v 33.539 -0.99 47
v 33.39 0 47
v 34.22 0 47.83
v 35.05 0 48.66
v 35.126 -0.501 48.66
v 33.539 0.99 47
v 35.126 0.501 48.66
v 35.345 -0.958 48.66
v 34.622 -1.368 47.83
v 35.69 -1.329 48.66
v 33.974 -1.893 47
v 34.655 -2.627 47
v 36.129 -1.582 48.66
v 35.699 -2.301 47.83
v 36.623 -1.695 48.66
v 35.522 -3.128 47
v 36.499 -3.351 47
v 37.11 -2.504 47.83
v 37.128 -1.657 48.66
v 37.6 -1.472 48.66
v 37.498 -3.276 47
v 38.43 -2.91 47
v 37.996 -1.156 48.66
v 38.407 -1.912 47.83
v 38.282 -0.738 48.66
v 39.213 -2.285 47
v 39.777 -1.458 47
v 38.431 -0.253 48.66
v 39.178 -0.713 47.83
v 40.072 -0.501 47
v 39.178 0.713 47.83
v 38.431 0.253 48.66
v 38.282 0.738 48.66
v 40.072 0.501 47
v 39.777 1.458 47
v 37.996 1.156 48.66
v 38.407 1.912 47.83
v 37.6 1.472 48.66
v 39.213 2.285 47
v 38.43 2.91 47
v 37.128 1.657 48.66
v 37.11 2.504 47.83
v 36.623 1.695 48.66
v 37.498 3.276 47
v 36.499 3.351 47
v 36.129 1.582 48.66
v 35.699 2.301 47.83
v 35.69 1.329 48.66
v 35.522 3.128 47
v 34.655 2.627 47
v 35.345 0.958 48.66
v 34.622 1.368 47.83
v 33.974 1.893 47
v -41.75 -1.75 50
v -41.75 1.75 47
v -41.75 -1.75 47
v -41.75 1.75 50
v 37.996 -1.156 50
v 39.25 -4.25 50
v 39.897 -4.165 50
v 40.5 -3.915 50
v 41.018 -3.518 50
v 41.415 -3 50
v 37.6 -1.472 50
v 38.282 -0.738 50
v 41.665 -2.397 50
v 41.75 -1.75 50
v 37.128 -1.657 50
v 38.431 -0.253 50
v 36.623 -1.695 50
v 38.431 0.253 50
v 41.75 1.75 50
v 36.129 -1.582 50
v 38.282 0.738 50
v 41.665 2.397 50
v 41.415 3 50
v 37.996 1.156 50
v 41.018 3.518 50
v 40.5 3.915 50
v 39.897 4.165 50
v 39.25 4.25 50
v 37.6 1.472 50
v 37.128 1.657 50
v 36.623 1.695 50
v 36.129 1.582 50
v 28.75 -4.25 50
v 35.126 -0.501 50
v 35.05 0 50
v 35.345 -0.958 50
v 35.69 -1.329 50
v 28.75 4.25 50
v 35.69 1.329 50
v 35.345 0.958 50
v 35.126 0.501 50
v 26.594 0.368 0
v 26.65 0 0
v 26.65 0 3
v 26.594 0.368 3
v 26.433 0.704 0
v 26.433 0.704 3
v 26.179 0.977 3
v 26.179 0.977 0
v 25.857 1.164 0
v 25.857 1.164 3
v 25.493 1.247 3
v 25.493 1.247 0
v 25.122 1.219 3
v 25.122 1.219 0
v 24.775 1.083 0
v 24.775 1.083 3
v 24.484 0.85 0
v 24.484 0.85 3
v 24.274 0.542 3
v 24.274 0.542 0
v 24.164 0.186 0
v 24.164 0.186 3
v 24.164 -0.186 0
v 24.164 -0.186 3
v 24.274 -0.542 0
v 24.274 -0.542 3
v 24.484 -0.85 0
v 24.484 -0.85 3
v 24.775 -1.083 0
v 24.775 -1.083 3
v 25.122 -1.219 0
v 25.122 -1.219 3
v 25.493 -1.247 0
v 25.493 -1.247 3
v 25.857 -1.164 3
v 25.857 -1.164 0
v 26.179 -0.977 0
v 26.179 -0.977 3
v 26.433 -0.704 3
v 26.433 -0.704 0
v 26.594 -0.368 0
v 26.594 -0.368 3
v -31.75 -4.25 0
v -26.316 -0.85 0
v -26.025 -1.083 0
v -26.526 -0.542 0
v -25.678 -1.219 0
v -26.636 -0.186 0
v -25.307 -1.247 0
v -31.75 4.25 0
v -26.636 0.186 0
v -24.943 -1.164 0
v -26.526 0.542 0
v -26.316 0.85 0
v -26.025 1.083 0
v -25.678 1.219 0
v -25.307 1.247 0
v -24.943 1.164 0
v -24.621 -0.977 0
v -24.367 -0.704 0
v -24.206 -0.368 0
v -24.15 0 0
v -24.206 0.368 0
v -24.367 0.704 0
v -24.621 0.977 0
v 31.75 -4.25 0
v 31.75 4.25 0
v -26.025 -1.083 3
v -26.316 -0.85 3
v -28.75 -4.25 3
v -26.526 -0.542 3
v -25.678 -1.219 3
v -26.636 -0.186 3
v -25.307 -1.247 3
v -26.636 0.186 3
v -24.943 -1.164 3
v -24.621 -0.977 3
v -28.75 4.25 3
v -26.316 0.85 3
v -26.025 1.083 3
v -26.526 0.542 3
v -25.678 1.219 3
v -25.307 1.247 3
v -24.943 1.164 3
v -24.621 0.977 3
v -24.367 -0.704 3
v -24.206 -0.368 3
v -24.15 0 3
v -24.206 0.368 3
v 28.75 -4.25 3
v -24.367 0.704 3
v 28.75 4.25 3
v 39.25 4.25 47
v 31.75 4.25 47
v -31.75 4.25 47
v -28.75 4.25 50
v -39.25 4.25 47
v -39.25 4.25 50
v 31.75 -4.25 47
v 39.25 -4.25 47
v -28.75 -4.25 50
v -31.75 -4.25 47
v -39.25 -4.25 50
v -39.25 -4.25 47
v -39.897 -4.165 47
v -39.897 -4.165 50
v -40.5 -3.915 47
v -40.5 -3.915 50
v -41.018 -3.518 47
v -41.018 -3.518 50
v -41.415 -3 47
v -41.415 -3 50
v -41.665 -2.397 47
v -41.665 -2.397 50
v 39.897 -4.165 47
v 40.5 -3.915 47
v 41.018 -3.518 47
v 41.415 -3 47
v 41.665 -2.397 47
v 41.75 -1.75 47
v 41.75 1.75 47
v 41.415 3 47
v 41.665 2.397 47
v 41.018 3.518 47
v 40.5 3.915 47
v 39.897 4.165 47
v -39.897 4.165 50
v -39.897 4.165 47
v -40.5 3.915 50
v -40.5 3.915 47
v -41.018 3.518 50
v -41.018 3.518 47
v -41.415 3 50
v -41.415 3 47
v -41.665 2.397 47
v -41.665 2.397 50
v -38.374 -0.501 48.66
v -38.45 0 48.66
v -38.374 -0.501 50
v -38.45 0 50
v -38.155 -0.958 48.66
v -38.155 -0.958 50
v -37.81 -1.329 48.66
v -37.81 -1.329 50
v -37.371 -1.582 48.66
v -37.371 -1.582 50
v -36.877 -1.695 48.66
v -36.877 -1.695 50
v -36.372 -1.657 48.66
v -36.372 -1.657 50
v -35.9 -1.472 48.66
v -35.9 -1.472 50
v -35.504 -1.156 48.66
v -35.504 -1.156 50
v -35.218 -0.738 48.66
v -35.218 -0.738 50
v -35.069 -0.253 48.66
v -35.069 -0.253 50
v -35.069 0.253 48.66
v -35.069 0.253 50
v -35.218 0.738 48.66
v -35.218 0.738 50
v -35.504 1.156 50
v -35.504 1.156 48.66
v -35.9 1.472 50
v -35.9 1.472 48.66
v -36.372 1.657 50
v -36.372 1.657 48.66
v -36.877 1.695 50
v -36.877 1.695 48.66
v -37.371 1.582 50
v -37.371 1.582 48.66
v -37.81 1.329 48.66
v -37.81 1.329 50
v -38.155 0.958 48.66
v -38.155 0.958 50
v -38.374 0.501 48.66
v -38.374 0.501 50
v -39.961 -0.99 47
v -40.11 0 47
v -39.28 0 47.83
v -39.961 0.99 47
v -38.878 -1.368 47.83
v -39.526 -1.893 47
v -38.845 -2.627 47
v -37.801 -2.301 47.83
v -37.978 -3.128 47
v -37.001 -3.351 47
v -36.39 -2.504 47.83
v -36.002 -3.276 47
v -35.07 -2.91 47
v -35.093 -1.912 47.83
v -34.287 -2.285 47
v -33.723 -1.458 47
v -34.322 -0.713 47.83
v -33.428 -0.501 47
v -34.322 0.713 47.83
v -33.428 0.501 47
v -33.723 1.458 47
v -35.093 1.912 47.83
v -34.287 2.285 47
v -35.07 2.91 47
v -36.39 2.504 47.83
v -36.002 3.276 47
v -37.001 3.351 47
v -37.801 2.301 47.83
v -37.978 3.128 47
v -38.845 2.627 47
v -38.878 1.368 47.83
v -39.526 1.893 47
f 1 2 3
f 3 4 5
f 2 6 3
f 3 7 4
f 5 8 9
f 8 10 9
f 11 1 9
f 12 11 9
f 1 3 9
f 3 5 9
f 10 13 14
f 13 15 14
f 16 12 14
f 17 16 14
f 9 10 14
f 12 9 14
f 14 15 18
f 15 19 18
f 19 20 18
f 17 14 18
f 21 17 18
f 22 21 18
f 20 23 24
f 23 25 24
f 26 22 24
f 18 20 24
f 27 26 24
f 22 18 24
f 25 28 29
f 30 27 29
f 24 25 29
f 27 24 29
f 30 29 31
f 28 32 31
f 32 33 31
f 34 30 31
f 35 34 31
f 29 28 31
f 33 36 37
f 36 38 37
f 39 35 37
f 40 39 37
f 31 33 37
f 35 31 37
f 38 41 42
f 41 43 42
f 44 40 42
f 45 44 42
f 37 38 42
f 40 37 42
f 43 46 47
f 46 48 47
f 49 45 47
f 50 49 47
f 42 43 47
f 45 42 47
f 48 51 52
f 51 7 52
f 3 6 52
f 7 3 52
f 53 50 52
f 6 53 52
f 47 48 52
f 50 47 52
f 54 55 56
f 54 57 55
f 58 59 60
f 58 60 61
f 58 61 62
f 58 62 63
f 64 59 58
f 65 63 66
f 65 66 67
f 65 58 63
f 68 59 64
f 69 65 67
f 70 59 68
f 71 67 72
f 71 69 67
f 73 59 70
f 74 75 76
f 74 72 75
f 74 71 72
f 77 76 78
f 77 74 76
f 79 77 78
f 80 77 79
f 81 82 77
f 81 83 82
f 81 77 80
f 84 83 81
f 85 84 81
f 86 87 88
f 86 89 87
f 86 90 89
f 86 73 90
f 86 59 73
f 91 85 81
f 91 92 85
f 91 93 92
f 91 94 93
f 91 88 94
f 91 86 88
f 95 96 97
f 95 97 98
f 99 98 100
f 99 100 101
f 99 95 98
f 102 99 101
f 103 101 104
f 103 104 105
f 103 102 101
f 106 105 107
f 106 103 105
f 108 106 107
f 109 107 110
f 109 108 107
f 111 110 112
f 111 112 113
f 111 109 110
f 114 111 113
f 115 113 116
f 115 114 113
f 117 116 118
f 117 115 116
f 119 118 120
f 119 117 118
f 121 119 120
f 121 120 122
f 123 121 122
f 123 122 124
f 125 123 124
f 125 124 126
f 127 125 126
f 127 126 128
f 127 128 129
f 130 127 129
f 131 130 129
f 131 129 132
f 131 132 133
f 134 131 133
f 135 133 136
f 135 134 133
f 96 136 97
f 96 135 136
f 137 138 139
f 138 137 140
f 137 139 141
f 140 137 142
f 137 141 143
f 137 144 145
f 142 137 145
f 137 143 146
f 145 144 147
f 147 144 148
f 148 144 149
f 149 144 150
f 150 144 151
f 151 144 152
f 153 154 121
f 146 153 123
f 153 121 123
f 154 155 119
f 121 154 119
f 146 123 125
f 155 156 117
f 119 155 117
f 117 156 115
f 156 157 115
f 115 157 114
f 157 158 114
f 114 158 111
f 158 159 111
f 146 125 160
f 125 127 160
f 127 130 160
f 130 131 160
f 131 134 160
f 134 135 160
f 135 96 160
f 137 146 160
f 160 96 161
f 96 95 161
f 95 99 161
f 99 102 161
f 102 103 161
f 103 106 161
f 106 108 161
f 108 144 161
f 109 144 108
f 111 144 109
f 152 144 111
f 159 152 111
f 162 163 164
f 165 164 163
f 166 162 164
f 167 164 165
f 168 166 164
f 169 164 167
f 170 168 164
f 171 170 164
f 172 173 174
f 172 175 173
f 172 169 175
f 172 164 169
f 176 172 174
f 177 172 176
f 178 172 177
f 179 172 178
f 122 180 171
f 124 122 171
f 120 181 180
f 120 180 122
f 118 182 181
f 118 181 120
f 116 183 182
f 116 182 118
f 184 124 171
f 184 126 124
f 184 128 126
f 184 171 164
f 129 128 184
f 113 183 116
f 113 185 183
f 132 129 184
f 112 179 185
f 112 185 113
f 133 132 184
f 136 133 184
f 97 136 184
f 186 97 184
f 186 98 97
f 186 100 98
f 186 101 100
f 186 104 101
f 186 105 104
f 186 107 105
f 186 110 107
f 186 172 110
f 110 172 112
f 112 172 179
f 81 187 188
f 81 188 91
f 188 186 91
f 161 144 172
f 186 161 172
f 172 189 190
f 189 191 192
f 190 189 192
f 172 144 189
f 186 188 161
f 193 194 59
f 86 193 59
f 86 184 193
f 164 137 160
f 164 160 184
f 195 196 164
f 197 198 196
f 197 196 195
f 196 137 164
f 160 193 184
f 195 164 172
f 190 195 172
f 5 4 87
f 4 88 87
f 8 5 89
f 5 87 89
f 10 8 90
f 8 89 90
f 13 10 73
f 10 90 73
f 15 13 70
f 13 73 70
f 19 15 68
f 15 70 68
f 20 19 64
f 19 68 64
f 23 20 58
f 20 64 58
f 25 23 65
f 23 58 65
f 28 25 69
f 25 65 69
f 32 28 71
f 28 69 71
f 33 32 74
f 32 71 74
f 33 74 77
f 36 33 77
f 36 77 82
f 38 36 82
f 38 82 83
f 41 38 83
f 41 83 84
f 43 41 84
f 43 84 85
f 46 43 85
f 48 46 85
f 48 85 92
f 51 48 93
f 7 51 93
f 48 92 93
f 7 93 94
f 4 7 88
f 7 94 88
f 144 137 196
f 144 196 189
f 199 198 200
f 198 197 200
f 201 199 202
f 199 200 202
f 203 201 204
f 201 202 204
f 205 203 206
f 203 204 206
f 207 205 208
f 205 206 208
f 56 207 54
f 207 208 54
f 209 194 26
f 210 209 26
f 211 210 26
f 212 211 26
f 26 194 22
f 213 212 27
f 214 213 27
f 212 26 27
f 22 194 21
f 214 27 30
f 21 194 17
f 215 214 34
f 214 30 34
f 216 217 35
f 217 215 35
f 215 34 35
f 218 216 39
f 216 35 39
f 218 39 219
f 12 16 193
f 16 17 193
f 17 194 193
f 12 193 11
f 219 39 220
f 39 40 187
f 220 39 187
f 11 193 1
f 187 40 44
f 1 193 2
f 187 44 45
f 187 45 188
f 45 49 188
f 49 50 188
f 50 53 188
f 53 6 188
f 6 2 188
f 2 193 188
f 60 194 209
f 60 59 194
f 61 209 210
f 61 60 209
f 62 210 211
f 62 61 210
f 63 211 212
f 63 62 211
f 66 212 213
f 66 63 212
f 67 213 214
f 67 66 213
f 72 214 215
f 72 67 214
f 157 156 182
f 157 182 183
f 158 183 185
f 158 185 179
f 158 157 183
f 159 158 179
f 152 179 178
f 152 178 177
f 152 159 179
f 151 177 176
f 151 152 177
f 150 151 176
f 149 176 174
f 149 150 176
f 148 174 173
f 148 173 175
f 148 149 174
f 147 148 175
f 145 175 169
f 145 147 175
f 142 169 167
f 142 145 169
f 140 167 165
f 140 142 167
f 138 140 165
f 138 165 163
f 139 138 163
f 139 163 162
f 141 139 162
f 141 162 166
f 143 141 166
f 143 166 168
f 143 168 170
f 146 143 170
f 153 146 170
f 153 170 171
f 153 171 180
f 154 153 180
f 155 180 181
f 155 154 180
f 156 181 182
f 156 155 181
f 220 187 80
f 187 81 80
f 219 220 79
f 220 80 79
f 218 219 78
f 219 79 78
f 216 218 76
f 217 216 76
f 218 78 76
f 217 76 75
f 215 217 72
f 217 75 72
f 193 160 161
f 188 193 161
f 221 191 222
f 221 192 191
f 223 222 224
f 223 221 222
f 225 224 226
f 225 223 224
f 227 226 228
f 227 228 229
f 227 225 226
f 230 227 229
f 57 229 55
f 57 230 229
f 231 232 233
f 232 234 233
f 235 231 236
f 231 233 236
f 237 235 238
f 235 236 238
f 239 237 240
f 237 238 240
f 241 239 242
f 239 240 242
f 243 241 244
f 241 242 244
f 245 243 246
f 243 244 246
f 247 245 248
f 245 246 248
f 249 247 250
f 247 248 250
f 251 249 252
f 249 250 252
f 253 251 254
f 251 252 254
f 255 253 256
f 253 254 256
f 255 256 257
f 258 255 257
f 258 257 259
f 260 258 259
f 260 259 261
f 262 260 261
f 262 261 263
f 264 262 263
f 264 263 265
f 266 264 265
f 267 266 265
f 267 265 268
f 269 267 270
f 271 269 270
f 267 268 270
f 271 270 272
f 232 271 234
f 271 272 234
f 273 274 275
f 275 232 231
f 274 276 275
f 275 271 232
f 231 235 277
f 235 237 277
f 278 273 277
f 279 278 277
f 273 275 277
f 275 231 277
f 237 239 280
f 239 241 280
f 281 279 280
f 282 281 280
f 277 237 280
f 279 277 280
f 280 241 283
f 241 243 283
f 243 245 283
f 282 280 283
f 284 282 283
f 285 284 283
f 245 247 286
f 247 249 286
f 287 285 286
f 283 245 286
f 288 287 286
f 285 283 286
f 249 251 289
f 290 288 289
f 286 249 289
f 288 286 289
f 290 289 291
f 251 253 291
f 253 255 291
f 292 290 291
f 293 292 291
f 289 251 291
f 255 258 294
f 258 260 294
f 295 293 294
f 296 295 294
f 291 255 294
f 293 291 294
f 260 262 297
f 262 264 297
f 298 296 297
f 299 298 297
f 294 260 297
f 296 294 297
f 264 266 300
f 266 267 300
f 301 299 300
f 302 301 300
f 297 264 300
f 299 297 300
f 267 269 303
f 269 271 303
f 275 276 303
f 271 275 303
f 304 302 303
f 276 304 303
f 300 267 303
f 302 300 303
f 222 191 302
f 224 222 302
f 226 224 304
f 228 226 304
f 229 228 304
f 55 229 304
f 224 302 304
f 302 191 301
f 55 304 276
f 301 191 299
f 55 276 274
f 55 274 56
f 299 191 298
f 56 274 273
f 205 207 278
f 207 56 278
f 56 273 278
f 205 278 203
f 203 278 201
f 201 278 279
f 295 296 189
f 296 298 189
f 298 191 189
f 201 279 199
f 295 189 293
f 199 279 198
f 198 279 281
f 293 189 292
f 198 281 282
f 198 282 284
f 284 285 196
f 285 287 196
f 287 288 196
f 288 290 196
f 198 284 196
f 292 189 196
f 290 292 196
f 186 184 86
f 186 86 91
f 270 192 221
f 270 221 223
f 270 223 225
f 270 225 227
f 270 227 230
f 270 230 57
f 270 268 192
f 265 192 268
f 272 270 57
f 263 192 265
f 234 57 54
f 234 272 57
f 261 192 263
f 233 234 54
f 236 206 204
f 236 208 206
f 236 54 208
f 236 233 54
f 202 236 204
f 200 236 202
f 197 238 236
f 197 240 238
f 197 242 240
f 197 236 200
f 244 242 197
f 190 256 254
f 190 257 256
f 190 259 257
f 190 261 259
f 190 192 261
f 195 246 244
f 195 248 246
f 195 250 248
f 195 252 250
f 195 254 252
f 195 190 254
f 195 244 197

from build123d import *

# Parameters (mm, degrees)
F0_W            = 63.5
F0_H            = 8.5
F0_R            = 1.25
F1_DEPTH        = 3
F2_W            = 3
F2_H            = 8.5
F3_DEPTH        = 47
F4_W            = 8.5
F4_H            = 3
F5_DEPTH        = 10
F6_W            = 8.5
F6_H            = 3
F7_DEPTH        = 10
F9_D            = 3.4
F9_DEPTH        = 5
F9_CSINK_D      = 6.72
F9_CSINK_ANGLE  = 90
F9_TIP          = 1.0214630523
F11_D           = 3.4
F11_DEPTH       = 5
F11_CSINK_D     = 6.72
F11_CSINK_ANGLE = 90
F11_TIP         = 1.0214630523
F12_R           = 2.5


with BuildPart() as f1:
    # F0 (on Top) → F1 (new body)
    with BuildSketch(Plane.XY):
        Rectangle(F0_W, F0_H)
        with Locations((-25.4, 0)):
            Circle(F0_R, mode=Mode.SUBTRACT)
        with Locations((25.4, 0)):
            Circle(F0_R, mode=Mode.SUBTRACT)
    extrude(amount=F1_DEPTH)

    # F2 (on face) → F3 (join)
    with BuildSketch(Plane.XY.offset(3)):
        with Locations((-30.25, 0)):
            Rectangle(F2_W, F2_H)
        with Locations((30.25, 0)):
            Rectangle(F2_W, F2_H)
    extrude(amount=F3_DEPTH)

    # F4 (on face) → F5 (join)
    with BuildSketch(Plane(origin=(-31.75, 0, 0), x_dir=(0, -1, 0), z_dir=(-1, 0, 0))):
        with Locations((0, 48.5)):
            Rectangle(F4_W, F4_H)
    extrude(amount=F5_DEPTH)

    # F6 (on face) → F7 (join)
    with BuildSketch(Plane.YZ.offset(31.75)):
        with Locations((0, 48.5)):
            Rectangle(F6_W, F6_H)
    extrude(amount=F7_DEPTH)

    # F9
    with Locations(Plane(origin=(0, 0, 47), x_dir=(1, 0, 0), z_dir=(0, 0, -1))):
        with Locations((-36.75, 0)):
            CounterSinkHole(F9_D / 2, F9_CSINK_D / 2, depth=F9_DEPTH, counter_sink_angle=F9_CSINK_ANGLE)
            with Locations((0, 0, -(F9_DEPTH + F9_TIP / 2))):  # 118° drill point
                Cone(0, F9_D / 2, F9_TIP, mode=Mode.SUBTRACT)

    # F11
    with Locations(Plane(origin=(0, 0, 47), x_dir=(1, 0, 0), z_dir=(0, 0, -1))):
        with Locations((36.75, 0)):
            CounterSinkHole(F11_D / 2, F11_CSINK_D / 2, depth=F11_DEPTH, counter_sink_angle=F11_CSINK_ANGLE)
            with Locations((0, 0, -(F11_DEPTH + F11_TIP / 2))):  # 118° drill point
                Cone(0, F11_D / 2, F11_TIP, mode=Mode.SUBTRACT)

    # F12
    f12_edges = [f1.edges().sort_by_distance(p)[0] for p in [
        (41.75, 4.25, 48.5),
        (41.75, -4.25, 48.5),
        (-41.75, 4.25, 48.5),
        (-41.75, -4.25, 48.5),
    ]]
    fillet(f12_edges, radius=F12_R)


solid = f1.part
